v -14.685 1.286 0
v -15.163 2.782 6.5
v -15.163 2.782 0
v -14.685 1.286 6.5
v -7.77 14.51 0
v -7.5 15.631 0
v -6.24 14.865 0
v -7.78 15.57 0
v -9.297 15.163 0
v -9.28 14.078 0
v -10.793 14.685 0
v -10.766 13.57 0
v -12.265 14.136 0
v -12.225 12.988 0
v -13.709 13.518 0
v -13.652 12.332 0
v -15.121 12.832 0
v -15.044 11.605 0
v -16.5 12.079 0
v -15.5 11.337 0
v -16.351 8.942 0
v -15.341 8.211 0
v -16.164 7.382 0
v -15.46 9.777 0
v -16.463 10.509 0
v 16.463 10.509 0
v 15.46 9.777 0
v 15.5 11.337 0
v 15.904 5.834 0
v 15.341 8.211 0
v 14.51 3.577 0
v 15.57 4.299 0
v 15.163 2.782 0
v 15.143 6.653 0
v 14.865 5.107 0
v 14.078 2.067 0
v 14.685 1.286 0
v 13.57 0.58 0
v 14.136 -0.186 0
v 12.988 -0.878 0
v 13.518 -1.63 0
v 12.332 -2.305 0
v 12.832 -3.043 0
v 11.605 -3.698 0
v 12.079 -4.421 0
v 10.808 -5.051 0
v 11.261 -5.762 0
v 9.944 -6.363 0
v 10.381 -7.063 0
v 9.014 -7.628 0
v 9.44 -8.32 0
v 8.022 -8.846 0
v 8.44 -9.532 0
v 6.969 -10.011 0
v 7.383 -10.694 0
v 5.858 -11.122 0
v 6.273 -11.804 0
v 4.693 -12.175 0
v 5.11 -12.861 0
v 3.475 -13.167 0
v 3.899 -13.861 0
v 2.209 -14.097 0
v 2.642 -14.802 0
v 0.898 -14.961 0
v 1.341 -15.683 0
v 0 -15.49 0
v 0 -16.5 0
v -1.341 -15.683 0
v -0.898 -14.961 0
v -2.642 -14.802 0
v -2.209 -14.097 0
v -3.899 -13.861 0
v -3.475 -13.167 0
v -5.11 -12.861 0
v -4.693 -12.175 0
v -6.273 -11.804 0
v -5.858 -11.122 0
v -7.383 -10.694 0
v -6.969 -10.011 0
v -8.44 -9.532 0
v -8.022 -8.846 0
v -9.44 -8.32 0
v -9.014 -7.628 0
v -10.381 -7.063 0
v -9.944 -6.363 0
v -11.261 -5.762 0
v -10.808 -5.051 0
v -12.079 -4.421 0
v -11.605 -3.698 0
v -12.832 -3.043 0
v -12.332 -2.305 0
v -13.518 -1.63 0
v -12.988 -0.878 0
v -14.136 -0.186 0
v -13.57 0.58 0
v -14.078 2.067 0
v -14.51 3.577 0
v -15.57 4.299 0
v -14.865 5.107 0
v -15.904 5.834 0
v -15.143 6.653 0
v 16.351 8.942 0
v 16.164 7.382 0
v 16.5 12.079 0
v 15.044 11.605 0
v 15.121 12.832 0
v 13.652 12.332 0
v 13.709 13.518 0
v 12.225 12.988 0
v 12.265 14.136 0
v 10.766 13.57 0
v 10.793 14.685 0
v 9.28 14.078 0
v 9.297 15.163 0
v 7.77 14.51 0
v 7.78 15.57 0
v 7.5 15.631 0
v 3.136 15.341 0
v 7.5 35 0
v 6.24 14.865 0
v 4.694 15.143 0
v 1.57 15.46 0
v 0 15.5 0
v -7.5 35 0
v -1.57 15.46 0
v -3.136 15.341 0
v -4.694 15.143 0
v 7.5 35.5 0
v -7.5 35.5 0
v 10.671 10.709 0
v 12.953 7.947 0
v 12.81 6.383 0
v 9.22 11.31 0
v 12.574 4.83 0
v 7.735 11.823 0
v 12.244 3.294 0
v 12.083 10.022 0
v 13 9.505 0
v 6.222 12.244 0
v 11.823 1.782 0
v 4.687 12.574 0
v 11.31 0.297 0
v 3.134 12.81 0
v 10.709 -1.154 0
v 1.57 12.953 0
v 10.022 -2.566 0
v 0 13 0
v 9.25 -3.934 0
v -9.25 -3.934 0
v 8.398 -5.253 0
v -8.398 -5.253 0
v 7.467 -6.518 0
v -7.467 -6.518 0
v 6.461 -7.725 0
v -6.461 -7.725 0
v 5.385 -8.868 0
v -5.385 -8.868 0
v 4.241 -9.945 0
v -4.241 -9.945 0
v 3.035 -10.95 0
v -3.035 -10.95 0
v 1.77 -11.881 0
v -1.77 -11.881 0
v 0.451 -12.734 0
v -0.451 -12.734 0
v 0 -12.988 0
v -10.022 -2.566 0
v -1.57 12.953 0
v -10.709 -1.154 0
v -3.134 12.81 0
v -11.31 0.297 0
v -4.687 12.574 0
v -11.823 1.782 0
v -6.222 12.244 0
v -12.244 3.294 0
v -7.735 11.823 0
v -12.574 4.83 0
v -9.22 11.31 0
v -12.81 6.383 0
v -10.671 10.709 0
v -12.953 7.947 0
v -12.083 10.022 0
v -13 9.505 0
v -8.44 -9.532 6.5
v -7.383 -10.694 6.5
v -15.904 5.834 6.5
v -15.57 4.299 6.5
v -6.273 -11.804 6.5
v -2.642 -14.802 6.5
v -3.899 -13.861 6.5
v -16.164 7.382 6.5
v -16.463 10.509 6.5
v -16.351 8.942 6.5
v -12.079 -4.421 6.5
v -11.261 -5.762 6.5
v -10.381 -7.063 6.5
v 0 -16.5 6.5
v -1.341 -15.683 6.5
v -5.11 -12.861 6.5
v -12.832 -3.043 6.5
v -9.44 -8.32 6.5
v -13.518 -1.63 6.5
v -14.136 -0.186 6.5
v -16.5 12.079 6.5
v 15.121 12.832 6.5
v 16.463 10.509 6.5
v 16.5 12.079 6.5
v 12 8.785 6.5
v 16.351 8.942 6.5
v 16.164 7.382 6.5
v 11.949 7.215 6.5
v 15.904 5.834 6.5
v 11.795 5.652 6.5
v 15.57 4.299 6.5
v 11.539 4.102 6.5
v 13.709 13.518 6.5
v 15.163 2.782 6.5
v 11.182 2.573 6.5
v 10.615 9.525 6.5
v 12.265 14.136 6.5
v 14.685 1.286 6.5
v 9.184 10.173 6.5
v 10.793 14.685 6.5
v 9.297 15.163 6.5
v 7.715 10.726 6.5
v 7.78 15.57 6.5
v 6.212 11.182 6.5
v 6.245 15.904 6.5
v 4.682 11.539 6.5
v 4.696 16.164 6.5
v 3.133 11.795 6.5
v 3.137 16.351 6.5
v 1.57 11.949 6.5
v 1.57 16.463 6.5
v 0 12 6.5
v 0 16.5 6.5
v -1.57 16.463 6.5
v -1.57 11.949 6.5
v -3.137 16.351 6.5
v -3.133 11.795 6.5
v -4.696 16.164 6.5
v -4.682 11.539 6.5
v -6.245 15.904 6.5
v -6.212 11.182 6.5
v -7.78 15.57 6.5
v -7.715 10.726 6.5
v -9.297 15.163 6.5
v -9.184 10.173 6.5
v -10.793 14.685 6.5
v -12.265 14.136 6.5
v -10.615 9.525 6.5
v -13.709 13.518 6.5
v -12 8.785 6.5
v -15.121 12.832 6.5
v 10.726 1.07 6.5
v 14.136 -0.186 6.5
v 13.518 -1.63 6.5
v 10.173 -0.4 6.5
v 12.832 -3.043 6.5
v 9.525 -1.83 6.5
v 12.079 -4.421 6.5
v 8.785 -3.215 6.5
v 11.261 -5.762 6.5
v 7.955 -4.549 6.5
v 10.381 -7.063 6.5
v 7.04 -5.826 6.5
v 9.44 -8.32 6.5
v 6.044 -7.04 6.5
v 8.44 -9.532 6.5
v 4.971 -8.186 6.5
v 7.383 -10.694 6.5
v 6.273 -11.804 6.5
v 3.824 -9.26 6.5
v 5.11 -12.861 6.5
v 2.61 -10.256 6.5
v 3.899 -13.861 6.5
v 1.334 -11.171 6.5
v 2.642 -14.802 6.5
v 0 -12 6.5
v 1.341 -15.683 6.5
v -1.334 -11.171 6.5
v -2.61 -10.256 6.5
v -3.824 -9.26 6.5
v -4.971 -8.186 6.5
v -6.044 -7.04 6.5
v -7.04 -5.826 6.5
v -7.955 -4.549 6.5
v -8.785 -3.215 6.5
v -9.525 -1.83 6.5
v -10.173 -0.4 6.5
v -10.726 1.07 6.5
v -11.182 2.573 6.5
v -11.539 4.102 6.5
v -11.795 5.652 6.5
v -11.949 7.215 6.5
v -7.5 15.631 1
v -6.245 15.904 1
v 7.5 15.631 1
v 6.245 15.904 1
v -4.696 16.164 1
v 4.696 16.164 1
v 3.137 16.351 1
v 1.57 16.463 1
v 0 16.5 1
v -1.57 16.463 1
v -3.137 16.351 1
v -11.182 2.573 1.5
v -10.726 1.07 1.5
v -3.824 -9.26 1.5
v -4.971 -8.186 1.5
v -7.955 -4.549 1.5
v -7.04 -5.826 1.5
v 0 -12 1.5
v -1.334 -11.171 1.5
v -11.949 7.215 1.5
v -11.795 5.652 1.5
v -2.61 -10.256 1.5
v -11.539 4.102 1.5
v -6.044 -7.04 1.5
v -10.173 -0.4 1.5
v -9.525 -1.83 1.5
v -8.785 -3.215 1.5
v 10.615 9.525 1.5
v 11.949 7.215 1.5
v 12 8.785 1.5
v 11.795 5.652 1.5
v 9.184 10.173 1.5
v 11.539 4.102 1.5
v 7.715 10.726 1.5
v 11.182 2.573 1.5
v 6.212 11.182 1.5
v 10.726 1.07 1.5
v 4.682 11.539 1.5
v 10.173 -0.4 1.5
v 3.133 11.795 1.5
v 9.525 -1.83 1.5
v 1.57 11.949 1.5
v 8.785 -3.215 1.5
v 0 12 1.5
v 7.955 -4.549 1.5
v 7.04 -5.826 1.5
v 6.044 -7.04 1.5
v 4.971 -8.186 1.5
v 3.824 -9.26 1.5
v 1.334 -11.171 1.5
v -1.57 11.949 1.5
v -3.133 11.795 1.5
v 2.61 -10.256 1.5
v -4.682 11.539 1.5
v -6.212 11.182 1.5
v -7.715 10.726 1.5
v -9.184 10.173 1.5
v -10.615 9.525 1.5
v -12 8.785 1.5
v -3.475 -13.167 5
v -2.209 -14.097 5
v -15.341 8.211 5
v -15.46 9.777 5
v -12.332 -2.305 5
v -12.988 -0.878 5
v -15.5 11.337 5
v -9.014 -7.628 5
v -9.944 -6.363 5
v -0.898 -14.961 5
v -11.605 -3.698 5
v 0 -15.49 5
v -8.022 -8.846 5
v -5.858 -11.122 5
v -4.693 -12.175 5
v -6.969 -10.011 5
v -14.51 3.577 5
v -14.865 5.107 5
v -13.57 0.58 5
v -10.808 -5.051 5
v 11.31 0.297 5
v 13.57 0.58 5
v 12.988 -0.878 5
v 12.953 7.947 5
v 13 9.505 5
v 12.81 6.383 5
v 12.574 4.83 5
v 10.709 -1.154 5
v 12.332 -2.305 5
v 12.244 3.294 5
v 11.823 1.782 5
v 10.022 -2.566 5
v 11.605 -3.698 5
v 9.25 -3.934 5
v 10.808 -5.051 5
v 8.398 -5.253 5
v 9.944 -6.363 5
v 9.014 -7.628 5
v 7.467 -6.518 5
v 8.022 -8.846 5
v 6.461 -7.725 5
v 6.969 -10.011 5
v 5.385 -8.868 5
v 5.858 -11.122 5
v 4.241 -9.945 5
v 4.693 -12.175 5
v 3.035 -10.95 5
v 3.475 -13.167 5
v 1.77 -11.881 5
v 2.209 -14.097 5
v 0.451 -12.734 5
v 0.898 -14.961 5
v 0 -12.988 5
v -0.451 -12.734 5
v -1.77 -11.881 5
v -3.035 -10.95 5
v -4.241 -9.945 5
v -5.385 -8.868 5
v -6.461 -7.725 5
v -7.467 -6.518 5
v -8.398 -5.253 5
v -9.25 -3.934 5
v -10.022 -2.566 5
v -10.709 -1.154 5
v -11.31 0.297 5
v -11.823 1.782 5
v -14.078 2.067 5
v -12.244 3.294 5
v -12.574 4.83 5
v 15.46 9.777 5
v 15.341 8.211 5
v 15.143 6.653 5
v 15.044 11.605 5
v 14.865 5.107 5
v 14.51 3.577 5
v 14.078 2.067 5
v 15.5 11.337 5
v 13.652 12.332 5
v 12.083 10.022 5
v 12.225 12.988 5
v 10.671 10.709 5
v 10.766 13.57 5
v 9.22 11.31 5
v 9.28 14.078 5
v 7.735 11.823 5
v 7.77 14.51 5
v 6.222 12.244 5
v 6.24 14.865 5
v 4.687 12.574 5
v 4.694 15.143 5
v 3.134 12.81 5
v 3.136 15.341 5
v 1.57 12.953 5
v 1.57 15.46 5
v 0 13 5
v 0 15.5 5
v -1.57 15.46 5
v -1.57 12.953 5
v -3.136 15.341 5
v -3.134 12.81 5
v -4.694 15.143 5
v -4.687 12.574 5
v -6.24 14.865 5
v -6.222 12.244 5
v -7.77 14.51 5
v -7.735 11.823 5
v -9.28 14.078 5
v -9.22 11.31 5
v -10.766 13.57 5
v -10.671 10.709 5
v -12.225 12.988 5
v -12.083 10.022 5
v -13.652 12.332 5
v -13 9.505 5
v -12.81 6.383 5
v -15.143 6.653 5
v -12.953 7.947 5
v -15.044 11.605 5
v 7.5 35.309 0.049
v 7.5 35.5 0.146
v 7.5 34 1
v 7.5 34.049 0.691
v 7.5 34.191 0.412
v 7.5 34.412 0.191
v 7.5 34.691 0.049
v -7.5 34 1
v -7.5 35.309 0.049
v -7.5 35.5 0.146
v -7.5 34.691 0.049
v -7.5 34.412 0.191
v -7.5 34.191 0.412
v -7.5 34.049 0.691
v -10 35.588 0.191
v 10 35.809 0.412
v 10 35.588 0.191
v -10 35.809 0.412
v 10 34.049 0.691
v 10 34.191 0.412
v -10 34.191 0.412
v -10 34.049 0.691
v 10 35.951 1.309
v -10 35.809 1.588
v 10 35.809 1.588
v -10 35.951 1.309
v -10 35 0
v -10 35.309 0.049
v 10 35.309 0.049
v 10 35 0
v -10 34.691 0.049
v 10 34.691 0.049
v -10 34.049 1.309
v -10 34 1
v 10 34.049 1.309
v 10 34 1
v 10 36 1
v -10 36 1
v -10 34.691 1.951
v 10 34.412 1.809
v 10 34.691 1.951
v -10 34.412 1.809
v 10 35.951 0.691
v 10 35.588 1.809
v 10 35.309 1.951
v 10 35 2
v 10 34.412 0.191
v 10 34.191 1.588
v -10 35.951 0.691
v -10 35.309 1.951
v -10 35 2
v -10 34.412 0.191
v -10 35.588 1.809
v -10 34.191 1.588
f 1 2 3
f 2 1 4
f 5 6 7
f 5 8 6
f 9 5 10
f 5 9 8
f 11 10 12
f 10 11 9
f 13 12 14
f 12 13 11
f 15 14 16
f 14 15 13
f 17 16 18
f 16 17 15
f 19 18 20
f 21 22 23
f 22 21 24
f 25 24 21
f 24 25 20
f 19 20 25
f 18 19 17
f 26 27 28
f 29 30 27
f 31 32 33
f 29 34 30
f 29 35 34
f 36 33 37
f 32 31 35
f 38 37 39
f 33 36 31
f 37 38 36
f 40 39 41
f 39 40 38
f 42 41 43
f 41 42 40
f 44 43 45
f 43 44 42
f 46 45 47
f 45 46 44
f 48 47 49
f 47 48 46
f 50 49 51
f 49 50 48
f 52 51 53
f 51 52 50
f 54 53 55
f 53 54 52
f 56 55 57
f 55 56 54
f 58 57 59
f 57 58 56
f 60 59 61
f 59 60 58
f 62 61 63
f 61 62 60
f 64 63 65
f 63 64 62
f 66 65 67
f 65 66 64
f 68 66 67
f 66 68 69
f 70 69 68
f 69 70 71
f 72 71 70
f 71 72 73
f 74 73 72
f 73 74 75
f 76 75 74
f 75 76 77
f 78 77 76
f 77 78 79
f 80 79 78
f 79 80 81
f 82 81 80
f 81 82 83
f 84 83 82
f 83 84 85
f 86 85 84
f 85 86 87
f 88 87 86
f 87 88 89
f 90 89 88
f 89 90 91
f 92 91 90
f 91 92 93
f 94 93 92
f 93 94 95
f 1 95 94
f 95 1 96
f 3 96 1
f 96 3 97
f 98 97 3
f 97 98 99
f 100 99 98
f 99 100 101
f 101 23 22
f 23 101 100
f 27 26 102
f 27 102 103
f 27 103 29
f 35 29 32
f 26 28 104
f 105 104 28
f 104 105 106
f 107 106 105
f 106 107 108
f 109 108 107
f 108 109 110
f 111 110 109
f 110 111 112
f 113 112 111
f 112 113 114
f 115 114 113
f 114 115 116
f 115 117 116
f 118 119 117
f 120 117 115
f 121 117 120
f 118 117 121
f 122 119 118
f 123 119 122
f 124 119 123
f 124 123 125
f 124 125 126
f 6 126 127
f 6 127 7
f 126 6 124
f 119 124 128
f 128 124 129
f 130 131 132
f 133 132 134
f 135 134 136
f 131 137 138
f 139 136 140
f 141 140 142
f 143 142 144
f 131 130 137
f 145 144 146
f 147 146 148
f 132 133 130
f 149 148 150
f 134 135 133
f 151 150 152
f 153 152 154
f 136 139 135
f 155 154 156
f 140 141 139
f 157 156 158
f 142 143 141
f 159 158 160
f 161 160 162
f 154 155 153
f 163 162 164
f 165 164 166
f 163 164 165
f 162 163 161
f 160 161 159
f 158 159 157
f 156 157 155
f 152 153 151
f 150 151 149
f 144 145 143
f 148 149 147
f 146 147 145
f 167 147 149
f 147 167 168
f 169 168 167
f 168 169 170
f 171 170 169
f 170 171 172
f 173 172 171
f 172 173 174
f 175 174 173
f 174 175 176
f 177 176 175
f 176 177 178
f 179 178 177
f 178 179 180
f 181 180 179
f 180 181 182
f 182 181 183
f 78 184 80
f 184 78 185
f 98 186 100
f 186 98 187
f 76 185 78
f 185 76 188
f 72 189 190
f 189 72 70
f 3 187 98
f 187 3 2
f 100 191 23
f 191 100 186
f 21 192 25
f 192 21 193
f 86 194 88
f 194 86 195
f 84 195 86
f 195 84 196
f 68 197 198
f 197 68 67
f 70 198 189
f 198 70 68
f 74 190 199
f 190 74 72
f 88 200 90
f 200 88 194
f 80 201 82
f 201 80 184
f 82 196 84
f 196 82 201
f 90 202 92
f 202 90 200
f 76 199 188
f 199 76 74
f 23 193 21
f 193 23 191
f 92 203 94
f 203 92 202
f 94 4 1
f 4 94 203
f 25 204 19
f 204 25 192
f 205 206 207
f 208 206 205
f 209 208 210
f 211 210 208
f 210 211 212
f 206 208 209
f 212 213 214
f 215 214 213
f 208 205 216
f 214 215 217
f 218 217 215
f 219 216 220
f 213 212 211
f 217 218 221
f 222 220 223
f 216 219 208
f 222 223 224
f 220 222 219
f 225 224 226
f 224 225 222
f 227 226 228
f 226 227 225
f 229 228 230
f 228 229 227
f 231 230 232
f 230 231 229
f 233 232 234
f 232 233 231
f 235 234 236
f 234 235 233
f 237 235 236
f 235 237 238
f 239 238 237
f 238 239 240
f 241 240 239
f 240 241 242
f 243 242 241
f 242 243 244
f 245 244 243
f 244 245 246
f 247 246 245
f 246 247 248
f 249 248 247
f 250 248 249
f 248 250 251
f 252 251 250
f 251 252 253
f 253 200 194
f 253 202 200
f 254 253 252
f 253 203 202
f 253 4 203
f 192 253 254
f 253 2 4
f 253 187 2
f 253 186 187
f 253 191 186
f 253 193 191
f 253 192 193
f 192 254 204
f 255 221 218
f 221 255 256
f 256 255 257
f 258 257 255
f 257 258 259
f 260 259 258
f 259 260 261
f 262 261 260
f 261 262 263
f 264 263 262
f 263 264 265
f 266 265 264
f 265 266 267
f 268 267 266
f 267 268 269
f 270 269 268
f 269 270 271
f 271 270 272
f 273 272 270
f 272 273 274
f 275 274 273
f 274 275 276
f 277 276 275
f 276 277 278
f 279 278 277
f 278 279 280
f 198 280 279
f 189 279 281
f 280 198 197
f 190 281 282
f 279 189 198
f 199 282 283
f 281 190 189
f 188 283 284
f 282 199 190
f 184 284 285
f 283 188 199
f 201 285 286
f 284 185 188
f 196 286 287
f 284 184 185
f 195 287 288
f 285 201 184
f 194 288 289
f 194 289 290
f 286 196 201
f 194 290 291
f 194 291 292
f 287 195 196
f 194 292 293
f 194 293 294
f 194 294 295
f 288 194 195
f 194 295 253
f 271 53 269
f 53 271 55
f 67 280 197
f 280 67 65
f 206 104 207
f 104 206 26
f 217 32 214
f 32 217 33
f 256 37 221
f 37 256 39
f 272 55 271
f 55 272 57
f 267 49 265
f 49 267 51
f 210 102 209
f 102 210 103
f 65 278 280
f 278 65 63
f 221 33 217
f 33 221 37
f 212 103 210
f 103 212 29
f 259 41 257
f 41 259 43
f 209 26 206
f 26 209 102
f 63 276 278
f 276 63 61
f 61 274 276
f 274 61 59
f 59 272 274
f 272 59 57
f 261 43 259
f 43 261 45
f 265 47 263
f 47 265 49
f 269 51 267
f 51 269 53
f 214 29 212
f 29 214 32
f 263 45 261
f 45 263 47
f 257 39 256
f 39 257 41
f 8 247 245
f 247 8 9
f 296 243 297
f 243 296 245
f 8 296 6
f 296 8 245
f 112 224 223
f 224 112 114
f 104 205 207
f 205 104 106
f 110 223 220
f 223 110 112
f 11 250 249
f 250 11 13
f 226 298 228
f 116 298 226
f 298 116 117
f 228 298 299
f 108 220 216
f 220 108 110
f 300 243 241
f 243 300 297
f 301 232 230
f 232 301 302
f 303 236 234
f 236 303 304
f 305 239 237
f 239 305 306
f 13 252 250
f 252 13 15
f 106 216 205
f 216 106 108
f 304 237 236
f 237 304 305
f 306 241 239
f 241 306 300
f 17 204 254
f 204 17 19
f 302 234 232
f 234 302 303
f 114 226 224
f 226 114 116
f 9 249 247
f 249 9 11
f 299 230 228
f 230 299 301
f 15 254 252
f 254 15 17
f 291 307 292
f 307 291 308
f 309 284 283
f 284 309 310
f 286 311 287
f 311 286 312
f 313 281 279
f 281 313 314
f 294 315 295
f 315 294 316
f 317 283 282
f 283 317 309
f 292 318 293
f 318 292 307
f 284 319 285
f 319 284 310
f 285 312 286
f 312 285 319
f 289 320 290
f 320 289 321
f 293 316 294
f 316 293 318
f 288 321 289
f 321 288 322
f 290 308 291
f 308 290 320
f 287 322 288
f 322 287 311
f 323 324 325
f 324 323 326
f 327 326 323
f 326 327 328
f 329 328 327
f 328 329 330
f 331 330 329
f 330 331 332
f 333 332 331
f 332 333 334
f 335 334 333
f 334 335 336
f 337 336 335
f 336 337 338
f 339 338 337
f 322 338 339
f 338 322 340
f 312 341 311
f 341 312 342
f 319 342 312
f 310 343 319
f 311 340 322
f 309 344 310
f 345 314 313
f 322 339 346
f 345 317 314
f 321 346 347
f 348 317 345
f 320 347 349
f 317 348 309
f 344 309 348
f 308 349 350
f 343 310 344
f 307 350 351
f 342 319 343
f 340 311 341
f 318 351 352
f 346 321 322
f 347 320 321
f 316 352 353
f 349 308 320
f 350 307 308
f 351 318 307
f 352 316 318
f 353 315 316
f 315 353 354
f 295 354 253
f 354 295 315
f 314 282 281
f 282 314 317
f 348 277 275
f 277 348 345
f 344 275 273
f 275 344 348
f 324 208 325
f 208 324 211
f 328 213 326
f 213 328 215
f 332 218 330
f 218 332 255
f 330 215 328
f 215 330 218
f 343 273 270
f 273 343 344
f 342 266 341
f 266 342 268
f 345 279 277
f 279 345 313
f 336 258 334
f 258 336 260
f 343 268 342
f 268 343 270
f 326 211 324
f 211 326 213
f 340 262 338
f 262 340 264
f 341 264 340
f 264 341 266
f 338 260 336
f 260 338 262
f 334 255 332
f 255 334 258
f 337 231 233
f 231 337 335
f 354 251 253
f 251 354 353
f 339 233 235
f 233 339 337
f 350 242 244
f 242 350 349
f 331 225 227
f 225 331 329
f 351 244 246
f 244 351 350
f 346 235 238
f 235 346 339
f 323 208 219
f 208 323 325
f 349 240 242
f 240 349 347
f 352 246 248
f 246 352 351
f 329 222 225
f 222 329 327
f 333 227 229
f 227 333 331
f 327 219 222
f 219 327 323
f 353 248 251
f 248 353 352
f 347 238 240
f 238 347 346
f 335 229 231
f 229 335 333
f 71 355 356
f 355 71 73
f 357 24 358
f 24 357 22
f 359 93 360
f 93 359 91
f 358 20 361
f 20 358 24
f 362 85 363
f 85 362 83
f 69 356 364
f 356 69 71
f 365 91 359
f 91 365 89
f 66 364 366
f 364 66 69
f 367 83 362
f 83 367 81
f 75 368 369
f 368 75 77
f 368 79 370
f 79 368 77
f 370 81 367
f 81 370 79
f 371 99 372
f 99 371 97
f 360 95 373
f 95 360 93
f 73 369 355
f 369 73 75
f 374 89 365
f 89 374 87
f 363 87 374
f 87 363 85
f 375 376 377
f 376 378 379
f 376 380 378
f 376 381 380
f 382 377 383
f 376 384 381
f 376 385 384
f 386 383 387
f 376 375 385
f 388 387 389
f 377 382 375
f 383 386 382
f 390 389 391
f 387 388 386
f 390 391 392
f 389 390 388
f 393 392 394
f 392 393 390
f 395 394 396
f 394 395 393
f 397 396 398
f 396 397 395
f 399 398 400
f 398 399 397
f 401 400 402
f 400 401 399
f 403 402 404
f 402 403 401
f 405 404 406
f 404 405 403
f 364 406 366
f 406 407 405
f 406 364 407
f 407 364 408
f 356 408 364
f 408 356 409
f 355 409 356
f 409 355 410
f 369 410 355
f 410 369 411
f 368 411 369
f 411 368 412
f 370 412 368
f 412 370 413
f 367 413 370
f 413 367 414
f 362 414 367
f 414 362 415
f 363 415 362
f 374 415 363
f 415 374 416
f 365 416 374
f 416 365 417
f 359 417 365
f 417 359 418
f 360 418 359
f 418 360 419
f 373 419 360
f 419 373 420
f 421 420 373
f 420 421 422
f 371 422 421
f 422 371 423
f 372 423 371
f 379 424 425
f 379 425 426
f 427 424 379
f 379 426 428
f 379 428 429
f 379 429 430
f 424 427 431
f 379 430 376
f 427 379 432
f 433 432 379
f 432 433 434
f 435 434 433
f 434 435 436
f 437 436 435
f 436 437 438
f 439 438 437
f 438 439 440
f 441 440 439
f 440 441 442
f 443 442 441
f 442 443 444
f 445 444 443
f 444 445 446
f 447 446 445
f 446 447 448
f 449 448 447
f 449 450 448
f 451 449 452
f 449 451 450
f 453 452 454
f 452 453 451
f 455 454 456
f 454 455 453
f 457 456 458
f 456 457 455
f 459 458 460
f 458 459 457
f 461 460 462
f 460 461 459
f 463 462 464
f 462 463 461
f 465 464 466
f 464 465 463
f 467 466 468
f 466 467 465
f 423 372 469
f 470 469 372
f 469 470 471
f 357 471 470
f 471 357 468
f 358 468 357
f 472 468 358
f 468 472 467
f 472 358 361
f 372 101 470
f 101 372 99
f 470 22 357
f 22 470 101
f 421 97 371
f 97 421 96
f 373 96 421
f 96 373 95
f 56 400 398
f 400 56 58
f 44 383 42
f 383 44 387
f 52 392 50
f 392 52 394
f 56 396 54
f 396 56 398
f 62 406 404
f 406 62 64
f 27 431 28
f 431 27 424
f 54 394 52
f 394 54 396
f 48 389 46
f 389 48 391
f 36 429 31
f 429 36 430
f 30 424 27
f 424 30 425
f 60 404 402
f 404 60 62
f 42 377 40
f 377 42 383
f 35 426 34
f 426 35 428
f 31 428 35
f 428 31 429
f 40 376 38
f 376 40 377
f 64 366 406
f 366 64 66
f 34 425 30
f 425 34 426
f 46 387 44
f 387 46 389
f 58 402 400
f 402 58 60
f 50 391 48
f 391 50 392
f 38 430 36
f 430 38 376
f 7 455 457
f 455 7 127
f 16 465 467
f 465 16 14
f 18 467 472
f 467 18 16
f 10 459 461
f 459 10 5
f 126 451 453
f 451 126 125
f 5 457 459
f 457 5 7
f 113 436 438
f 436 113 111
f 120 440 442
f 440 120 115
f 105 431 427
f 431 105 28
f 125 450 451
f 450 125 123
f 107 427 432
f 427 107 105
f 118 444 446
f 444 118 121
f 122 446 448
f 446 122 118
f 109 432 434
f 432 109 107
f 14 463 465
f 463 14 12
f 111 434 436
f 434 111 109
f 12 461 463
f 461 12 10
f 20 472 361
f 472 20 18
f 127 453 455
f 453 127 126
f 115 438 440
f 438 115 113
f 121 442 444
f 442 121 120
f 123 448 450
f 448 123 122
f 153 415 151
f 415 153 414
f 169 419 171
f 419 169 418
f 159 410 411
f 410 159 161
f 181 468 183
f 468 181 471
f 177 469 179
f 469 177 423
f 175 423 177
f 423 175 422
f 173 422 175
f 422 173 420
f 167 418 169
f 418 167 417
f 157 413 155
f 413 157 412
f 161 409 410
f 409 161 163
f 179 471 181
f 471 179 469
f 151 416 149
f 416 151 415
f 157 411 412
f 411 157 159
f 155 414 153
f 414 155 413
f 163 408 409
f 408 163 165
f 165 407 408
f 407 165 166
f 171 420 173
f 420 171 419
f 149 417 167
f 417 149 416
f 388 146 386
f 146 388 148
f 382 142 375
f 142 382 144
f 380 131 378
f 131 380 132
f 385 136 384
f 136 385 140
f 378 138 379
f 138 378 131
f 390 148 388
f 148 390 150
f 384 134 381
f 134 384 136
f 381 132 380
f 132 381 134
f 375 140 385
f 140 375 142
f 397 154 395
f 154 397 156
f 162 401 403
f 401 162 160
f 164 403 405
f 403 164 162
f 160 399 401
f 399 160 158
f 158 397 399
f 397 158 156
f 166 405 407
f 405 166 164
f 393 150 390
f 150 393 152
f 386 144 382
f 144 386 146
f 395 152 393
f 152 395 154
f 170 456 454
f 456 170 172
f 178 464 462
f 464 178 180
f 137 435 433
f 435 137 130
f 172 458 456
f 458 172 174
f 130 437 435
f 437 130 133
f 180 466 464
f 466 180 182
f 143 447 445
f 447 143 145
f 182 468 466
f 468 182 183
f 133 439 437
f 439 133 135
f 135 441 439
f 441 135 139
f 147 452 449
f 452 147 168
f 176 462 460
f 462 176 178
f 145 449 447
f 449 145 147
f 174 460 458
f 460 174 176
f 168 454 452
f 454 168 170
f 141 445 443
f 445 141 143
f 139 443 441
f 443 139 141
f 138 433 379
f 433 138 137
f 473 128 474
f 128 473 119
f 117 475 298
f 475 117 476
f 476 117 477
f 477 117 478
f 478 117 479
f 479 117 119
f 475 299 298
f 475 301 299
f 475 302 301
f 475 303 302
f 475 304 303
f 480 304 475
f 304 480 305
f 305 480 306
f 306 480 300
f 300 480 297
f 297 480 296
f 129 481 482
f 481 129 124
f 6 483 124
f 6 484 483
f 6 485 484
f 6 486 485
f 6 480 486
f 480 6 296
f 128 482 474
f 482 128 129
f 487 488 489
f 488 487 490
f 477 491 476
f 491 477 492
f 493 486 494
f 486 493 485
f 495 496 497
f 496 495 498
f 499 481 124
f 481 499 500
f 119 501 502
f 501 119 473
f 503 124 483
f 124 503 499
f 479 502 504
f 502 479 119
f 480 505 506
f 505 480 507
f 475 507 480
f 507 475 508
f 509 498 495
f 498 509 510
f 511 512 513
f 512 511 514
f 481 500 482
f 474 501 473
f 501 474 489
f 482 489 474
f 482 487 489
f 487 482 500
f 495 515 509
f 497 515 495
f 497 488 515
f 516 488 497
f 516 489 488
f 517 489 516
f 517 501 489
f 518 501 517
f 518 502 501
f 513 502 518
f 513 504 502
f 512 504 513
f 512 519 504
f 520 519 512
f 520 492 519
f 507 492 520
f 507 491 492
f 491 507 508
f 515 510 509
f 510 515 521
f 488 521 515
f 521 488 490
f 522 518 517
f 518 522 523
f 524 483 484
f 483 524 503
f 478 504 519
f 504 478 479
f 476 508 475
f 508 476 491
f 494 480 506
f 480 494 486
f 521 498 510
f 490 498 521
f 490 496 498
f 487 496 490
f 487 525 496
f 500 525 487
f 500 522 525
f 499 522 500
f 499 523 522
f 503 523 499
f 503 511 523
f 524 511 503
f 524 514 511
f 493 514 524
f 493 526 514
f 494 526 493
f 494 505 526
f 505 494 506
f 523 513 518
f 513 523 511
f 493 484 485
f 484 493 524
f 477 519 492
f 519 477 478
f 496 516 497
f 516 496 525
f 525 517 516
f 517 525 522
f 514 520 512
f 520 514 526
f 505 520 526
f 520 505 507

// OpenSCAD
module borderRoundedTriangle(height,size) {
  sPos = size/2;
  yPos = sqrt((size*size)-(sPos*sPos))-sPos;
  translate([0,-(sPos-yPos),0])
  intersection() {
    translate([sPos,sPos,0]) cylinder(h=height, d=size*2, $fn=size*4);
    translate([-sPos,sPos,0]) cylinder(h=height, d=size*2, $fn=size*4);
    translate([0,-yPos,0]) cylinder(h=height, d=size*2, $fn=size*4);
  }
}

difference() {
  borderRoundedTriangle(6.5,33);

  translate([0,0,1.5]) borderRoundedTriangle(5,24);

  difference() {
    borderRoundedTriangle(5,31);
    borderRoundedTriangle(5,26);
  }
}

translate([0,25.5,0])
difference() {
  translate([0,0,0.5]) cube([15,20,1], center=true);
  translate([0,-42.5,0]) cylinder(h=1, d=66, $fn=50);
}

translate([-10,35,1]) rotate([0, 90, 0]) cylinder(h=20, d=2, $fn=20)
translate([0,-12.3,0.5]) cube([4,3,1], center=true);
